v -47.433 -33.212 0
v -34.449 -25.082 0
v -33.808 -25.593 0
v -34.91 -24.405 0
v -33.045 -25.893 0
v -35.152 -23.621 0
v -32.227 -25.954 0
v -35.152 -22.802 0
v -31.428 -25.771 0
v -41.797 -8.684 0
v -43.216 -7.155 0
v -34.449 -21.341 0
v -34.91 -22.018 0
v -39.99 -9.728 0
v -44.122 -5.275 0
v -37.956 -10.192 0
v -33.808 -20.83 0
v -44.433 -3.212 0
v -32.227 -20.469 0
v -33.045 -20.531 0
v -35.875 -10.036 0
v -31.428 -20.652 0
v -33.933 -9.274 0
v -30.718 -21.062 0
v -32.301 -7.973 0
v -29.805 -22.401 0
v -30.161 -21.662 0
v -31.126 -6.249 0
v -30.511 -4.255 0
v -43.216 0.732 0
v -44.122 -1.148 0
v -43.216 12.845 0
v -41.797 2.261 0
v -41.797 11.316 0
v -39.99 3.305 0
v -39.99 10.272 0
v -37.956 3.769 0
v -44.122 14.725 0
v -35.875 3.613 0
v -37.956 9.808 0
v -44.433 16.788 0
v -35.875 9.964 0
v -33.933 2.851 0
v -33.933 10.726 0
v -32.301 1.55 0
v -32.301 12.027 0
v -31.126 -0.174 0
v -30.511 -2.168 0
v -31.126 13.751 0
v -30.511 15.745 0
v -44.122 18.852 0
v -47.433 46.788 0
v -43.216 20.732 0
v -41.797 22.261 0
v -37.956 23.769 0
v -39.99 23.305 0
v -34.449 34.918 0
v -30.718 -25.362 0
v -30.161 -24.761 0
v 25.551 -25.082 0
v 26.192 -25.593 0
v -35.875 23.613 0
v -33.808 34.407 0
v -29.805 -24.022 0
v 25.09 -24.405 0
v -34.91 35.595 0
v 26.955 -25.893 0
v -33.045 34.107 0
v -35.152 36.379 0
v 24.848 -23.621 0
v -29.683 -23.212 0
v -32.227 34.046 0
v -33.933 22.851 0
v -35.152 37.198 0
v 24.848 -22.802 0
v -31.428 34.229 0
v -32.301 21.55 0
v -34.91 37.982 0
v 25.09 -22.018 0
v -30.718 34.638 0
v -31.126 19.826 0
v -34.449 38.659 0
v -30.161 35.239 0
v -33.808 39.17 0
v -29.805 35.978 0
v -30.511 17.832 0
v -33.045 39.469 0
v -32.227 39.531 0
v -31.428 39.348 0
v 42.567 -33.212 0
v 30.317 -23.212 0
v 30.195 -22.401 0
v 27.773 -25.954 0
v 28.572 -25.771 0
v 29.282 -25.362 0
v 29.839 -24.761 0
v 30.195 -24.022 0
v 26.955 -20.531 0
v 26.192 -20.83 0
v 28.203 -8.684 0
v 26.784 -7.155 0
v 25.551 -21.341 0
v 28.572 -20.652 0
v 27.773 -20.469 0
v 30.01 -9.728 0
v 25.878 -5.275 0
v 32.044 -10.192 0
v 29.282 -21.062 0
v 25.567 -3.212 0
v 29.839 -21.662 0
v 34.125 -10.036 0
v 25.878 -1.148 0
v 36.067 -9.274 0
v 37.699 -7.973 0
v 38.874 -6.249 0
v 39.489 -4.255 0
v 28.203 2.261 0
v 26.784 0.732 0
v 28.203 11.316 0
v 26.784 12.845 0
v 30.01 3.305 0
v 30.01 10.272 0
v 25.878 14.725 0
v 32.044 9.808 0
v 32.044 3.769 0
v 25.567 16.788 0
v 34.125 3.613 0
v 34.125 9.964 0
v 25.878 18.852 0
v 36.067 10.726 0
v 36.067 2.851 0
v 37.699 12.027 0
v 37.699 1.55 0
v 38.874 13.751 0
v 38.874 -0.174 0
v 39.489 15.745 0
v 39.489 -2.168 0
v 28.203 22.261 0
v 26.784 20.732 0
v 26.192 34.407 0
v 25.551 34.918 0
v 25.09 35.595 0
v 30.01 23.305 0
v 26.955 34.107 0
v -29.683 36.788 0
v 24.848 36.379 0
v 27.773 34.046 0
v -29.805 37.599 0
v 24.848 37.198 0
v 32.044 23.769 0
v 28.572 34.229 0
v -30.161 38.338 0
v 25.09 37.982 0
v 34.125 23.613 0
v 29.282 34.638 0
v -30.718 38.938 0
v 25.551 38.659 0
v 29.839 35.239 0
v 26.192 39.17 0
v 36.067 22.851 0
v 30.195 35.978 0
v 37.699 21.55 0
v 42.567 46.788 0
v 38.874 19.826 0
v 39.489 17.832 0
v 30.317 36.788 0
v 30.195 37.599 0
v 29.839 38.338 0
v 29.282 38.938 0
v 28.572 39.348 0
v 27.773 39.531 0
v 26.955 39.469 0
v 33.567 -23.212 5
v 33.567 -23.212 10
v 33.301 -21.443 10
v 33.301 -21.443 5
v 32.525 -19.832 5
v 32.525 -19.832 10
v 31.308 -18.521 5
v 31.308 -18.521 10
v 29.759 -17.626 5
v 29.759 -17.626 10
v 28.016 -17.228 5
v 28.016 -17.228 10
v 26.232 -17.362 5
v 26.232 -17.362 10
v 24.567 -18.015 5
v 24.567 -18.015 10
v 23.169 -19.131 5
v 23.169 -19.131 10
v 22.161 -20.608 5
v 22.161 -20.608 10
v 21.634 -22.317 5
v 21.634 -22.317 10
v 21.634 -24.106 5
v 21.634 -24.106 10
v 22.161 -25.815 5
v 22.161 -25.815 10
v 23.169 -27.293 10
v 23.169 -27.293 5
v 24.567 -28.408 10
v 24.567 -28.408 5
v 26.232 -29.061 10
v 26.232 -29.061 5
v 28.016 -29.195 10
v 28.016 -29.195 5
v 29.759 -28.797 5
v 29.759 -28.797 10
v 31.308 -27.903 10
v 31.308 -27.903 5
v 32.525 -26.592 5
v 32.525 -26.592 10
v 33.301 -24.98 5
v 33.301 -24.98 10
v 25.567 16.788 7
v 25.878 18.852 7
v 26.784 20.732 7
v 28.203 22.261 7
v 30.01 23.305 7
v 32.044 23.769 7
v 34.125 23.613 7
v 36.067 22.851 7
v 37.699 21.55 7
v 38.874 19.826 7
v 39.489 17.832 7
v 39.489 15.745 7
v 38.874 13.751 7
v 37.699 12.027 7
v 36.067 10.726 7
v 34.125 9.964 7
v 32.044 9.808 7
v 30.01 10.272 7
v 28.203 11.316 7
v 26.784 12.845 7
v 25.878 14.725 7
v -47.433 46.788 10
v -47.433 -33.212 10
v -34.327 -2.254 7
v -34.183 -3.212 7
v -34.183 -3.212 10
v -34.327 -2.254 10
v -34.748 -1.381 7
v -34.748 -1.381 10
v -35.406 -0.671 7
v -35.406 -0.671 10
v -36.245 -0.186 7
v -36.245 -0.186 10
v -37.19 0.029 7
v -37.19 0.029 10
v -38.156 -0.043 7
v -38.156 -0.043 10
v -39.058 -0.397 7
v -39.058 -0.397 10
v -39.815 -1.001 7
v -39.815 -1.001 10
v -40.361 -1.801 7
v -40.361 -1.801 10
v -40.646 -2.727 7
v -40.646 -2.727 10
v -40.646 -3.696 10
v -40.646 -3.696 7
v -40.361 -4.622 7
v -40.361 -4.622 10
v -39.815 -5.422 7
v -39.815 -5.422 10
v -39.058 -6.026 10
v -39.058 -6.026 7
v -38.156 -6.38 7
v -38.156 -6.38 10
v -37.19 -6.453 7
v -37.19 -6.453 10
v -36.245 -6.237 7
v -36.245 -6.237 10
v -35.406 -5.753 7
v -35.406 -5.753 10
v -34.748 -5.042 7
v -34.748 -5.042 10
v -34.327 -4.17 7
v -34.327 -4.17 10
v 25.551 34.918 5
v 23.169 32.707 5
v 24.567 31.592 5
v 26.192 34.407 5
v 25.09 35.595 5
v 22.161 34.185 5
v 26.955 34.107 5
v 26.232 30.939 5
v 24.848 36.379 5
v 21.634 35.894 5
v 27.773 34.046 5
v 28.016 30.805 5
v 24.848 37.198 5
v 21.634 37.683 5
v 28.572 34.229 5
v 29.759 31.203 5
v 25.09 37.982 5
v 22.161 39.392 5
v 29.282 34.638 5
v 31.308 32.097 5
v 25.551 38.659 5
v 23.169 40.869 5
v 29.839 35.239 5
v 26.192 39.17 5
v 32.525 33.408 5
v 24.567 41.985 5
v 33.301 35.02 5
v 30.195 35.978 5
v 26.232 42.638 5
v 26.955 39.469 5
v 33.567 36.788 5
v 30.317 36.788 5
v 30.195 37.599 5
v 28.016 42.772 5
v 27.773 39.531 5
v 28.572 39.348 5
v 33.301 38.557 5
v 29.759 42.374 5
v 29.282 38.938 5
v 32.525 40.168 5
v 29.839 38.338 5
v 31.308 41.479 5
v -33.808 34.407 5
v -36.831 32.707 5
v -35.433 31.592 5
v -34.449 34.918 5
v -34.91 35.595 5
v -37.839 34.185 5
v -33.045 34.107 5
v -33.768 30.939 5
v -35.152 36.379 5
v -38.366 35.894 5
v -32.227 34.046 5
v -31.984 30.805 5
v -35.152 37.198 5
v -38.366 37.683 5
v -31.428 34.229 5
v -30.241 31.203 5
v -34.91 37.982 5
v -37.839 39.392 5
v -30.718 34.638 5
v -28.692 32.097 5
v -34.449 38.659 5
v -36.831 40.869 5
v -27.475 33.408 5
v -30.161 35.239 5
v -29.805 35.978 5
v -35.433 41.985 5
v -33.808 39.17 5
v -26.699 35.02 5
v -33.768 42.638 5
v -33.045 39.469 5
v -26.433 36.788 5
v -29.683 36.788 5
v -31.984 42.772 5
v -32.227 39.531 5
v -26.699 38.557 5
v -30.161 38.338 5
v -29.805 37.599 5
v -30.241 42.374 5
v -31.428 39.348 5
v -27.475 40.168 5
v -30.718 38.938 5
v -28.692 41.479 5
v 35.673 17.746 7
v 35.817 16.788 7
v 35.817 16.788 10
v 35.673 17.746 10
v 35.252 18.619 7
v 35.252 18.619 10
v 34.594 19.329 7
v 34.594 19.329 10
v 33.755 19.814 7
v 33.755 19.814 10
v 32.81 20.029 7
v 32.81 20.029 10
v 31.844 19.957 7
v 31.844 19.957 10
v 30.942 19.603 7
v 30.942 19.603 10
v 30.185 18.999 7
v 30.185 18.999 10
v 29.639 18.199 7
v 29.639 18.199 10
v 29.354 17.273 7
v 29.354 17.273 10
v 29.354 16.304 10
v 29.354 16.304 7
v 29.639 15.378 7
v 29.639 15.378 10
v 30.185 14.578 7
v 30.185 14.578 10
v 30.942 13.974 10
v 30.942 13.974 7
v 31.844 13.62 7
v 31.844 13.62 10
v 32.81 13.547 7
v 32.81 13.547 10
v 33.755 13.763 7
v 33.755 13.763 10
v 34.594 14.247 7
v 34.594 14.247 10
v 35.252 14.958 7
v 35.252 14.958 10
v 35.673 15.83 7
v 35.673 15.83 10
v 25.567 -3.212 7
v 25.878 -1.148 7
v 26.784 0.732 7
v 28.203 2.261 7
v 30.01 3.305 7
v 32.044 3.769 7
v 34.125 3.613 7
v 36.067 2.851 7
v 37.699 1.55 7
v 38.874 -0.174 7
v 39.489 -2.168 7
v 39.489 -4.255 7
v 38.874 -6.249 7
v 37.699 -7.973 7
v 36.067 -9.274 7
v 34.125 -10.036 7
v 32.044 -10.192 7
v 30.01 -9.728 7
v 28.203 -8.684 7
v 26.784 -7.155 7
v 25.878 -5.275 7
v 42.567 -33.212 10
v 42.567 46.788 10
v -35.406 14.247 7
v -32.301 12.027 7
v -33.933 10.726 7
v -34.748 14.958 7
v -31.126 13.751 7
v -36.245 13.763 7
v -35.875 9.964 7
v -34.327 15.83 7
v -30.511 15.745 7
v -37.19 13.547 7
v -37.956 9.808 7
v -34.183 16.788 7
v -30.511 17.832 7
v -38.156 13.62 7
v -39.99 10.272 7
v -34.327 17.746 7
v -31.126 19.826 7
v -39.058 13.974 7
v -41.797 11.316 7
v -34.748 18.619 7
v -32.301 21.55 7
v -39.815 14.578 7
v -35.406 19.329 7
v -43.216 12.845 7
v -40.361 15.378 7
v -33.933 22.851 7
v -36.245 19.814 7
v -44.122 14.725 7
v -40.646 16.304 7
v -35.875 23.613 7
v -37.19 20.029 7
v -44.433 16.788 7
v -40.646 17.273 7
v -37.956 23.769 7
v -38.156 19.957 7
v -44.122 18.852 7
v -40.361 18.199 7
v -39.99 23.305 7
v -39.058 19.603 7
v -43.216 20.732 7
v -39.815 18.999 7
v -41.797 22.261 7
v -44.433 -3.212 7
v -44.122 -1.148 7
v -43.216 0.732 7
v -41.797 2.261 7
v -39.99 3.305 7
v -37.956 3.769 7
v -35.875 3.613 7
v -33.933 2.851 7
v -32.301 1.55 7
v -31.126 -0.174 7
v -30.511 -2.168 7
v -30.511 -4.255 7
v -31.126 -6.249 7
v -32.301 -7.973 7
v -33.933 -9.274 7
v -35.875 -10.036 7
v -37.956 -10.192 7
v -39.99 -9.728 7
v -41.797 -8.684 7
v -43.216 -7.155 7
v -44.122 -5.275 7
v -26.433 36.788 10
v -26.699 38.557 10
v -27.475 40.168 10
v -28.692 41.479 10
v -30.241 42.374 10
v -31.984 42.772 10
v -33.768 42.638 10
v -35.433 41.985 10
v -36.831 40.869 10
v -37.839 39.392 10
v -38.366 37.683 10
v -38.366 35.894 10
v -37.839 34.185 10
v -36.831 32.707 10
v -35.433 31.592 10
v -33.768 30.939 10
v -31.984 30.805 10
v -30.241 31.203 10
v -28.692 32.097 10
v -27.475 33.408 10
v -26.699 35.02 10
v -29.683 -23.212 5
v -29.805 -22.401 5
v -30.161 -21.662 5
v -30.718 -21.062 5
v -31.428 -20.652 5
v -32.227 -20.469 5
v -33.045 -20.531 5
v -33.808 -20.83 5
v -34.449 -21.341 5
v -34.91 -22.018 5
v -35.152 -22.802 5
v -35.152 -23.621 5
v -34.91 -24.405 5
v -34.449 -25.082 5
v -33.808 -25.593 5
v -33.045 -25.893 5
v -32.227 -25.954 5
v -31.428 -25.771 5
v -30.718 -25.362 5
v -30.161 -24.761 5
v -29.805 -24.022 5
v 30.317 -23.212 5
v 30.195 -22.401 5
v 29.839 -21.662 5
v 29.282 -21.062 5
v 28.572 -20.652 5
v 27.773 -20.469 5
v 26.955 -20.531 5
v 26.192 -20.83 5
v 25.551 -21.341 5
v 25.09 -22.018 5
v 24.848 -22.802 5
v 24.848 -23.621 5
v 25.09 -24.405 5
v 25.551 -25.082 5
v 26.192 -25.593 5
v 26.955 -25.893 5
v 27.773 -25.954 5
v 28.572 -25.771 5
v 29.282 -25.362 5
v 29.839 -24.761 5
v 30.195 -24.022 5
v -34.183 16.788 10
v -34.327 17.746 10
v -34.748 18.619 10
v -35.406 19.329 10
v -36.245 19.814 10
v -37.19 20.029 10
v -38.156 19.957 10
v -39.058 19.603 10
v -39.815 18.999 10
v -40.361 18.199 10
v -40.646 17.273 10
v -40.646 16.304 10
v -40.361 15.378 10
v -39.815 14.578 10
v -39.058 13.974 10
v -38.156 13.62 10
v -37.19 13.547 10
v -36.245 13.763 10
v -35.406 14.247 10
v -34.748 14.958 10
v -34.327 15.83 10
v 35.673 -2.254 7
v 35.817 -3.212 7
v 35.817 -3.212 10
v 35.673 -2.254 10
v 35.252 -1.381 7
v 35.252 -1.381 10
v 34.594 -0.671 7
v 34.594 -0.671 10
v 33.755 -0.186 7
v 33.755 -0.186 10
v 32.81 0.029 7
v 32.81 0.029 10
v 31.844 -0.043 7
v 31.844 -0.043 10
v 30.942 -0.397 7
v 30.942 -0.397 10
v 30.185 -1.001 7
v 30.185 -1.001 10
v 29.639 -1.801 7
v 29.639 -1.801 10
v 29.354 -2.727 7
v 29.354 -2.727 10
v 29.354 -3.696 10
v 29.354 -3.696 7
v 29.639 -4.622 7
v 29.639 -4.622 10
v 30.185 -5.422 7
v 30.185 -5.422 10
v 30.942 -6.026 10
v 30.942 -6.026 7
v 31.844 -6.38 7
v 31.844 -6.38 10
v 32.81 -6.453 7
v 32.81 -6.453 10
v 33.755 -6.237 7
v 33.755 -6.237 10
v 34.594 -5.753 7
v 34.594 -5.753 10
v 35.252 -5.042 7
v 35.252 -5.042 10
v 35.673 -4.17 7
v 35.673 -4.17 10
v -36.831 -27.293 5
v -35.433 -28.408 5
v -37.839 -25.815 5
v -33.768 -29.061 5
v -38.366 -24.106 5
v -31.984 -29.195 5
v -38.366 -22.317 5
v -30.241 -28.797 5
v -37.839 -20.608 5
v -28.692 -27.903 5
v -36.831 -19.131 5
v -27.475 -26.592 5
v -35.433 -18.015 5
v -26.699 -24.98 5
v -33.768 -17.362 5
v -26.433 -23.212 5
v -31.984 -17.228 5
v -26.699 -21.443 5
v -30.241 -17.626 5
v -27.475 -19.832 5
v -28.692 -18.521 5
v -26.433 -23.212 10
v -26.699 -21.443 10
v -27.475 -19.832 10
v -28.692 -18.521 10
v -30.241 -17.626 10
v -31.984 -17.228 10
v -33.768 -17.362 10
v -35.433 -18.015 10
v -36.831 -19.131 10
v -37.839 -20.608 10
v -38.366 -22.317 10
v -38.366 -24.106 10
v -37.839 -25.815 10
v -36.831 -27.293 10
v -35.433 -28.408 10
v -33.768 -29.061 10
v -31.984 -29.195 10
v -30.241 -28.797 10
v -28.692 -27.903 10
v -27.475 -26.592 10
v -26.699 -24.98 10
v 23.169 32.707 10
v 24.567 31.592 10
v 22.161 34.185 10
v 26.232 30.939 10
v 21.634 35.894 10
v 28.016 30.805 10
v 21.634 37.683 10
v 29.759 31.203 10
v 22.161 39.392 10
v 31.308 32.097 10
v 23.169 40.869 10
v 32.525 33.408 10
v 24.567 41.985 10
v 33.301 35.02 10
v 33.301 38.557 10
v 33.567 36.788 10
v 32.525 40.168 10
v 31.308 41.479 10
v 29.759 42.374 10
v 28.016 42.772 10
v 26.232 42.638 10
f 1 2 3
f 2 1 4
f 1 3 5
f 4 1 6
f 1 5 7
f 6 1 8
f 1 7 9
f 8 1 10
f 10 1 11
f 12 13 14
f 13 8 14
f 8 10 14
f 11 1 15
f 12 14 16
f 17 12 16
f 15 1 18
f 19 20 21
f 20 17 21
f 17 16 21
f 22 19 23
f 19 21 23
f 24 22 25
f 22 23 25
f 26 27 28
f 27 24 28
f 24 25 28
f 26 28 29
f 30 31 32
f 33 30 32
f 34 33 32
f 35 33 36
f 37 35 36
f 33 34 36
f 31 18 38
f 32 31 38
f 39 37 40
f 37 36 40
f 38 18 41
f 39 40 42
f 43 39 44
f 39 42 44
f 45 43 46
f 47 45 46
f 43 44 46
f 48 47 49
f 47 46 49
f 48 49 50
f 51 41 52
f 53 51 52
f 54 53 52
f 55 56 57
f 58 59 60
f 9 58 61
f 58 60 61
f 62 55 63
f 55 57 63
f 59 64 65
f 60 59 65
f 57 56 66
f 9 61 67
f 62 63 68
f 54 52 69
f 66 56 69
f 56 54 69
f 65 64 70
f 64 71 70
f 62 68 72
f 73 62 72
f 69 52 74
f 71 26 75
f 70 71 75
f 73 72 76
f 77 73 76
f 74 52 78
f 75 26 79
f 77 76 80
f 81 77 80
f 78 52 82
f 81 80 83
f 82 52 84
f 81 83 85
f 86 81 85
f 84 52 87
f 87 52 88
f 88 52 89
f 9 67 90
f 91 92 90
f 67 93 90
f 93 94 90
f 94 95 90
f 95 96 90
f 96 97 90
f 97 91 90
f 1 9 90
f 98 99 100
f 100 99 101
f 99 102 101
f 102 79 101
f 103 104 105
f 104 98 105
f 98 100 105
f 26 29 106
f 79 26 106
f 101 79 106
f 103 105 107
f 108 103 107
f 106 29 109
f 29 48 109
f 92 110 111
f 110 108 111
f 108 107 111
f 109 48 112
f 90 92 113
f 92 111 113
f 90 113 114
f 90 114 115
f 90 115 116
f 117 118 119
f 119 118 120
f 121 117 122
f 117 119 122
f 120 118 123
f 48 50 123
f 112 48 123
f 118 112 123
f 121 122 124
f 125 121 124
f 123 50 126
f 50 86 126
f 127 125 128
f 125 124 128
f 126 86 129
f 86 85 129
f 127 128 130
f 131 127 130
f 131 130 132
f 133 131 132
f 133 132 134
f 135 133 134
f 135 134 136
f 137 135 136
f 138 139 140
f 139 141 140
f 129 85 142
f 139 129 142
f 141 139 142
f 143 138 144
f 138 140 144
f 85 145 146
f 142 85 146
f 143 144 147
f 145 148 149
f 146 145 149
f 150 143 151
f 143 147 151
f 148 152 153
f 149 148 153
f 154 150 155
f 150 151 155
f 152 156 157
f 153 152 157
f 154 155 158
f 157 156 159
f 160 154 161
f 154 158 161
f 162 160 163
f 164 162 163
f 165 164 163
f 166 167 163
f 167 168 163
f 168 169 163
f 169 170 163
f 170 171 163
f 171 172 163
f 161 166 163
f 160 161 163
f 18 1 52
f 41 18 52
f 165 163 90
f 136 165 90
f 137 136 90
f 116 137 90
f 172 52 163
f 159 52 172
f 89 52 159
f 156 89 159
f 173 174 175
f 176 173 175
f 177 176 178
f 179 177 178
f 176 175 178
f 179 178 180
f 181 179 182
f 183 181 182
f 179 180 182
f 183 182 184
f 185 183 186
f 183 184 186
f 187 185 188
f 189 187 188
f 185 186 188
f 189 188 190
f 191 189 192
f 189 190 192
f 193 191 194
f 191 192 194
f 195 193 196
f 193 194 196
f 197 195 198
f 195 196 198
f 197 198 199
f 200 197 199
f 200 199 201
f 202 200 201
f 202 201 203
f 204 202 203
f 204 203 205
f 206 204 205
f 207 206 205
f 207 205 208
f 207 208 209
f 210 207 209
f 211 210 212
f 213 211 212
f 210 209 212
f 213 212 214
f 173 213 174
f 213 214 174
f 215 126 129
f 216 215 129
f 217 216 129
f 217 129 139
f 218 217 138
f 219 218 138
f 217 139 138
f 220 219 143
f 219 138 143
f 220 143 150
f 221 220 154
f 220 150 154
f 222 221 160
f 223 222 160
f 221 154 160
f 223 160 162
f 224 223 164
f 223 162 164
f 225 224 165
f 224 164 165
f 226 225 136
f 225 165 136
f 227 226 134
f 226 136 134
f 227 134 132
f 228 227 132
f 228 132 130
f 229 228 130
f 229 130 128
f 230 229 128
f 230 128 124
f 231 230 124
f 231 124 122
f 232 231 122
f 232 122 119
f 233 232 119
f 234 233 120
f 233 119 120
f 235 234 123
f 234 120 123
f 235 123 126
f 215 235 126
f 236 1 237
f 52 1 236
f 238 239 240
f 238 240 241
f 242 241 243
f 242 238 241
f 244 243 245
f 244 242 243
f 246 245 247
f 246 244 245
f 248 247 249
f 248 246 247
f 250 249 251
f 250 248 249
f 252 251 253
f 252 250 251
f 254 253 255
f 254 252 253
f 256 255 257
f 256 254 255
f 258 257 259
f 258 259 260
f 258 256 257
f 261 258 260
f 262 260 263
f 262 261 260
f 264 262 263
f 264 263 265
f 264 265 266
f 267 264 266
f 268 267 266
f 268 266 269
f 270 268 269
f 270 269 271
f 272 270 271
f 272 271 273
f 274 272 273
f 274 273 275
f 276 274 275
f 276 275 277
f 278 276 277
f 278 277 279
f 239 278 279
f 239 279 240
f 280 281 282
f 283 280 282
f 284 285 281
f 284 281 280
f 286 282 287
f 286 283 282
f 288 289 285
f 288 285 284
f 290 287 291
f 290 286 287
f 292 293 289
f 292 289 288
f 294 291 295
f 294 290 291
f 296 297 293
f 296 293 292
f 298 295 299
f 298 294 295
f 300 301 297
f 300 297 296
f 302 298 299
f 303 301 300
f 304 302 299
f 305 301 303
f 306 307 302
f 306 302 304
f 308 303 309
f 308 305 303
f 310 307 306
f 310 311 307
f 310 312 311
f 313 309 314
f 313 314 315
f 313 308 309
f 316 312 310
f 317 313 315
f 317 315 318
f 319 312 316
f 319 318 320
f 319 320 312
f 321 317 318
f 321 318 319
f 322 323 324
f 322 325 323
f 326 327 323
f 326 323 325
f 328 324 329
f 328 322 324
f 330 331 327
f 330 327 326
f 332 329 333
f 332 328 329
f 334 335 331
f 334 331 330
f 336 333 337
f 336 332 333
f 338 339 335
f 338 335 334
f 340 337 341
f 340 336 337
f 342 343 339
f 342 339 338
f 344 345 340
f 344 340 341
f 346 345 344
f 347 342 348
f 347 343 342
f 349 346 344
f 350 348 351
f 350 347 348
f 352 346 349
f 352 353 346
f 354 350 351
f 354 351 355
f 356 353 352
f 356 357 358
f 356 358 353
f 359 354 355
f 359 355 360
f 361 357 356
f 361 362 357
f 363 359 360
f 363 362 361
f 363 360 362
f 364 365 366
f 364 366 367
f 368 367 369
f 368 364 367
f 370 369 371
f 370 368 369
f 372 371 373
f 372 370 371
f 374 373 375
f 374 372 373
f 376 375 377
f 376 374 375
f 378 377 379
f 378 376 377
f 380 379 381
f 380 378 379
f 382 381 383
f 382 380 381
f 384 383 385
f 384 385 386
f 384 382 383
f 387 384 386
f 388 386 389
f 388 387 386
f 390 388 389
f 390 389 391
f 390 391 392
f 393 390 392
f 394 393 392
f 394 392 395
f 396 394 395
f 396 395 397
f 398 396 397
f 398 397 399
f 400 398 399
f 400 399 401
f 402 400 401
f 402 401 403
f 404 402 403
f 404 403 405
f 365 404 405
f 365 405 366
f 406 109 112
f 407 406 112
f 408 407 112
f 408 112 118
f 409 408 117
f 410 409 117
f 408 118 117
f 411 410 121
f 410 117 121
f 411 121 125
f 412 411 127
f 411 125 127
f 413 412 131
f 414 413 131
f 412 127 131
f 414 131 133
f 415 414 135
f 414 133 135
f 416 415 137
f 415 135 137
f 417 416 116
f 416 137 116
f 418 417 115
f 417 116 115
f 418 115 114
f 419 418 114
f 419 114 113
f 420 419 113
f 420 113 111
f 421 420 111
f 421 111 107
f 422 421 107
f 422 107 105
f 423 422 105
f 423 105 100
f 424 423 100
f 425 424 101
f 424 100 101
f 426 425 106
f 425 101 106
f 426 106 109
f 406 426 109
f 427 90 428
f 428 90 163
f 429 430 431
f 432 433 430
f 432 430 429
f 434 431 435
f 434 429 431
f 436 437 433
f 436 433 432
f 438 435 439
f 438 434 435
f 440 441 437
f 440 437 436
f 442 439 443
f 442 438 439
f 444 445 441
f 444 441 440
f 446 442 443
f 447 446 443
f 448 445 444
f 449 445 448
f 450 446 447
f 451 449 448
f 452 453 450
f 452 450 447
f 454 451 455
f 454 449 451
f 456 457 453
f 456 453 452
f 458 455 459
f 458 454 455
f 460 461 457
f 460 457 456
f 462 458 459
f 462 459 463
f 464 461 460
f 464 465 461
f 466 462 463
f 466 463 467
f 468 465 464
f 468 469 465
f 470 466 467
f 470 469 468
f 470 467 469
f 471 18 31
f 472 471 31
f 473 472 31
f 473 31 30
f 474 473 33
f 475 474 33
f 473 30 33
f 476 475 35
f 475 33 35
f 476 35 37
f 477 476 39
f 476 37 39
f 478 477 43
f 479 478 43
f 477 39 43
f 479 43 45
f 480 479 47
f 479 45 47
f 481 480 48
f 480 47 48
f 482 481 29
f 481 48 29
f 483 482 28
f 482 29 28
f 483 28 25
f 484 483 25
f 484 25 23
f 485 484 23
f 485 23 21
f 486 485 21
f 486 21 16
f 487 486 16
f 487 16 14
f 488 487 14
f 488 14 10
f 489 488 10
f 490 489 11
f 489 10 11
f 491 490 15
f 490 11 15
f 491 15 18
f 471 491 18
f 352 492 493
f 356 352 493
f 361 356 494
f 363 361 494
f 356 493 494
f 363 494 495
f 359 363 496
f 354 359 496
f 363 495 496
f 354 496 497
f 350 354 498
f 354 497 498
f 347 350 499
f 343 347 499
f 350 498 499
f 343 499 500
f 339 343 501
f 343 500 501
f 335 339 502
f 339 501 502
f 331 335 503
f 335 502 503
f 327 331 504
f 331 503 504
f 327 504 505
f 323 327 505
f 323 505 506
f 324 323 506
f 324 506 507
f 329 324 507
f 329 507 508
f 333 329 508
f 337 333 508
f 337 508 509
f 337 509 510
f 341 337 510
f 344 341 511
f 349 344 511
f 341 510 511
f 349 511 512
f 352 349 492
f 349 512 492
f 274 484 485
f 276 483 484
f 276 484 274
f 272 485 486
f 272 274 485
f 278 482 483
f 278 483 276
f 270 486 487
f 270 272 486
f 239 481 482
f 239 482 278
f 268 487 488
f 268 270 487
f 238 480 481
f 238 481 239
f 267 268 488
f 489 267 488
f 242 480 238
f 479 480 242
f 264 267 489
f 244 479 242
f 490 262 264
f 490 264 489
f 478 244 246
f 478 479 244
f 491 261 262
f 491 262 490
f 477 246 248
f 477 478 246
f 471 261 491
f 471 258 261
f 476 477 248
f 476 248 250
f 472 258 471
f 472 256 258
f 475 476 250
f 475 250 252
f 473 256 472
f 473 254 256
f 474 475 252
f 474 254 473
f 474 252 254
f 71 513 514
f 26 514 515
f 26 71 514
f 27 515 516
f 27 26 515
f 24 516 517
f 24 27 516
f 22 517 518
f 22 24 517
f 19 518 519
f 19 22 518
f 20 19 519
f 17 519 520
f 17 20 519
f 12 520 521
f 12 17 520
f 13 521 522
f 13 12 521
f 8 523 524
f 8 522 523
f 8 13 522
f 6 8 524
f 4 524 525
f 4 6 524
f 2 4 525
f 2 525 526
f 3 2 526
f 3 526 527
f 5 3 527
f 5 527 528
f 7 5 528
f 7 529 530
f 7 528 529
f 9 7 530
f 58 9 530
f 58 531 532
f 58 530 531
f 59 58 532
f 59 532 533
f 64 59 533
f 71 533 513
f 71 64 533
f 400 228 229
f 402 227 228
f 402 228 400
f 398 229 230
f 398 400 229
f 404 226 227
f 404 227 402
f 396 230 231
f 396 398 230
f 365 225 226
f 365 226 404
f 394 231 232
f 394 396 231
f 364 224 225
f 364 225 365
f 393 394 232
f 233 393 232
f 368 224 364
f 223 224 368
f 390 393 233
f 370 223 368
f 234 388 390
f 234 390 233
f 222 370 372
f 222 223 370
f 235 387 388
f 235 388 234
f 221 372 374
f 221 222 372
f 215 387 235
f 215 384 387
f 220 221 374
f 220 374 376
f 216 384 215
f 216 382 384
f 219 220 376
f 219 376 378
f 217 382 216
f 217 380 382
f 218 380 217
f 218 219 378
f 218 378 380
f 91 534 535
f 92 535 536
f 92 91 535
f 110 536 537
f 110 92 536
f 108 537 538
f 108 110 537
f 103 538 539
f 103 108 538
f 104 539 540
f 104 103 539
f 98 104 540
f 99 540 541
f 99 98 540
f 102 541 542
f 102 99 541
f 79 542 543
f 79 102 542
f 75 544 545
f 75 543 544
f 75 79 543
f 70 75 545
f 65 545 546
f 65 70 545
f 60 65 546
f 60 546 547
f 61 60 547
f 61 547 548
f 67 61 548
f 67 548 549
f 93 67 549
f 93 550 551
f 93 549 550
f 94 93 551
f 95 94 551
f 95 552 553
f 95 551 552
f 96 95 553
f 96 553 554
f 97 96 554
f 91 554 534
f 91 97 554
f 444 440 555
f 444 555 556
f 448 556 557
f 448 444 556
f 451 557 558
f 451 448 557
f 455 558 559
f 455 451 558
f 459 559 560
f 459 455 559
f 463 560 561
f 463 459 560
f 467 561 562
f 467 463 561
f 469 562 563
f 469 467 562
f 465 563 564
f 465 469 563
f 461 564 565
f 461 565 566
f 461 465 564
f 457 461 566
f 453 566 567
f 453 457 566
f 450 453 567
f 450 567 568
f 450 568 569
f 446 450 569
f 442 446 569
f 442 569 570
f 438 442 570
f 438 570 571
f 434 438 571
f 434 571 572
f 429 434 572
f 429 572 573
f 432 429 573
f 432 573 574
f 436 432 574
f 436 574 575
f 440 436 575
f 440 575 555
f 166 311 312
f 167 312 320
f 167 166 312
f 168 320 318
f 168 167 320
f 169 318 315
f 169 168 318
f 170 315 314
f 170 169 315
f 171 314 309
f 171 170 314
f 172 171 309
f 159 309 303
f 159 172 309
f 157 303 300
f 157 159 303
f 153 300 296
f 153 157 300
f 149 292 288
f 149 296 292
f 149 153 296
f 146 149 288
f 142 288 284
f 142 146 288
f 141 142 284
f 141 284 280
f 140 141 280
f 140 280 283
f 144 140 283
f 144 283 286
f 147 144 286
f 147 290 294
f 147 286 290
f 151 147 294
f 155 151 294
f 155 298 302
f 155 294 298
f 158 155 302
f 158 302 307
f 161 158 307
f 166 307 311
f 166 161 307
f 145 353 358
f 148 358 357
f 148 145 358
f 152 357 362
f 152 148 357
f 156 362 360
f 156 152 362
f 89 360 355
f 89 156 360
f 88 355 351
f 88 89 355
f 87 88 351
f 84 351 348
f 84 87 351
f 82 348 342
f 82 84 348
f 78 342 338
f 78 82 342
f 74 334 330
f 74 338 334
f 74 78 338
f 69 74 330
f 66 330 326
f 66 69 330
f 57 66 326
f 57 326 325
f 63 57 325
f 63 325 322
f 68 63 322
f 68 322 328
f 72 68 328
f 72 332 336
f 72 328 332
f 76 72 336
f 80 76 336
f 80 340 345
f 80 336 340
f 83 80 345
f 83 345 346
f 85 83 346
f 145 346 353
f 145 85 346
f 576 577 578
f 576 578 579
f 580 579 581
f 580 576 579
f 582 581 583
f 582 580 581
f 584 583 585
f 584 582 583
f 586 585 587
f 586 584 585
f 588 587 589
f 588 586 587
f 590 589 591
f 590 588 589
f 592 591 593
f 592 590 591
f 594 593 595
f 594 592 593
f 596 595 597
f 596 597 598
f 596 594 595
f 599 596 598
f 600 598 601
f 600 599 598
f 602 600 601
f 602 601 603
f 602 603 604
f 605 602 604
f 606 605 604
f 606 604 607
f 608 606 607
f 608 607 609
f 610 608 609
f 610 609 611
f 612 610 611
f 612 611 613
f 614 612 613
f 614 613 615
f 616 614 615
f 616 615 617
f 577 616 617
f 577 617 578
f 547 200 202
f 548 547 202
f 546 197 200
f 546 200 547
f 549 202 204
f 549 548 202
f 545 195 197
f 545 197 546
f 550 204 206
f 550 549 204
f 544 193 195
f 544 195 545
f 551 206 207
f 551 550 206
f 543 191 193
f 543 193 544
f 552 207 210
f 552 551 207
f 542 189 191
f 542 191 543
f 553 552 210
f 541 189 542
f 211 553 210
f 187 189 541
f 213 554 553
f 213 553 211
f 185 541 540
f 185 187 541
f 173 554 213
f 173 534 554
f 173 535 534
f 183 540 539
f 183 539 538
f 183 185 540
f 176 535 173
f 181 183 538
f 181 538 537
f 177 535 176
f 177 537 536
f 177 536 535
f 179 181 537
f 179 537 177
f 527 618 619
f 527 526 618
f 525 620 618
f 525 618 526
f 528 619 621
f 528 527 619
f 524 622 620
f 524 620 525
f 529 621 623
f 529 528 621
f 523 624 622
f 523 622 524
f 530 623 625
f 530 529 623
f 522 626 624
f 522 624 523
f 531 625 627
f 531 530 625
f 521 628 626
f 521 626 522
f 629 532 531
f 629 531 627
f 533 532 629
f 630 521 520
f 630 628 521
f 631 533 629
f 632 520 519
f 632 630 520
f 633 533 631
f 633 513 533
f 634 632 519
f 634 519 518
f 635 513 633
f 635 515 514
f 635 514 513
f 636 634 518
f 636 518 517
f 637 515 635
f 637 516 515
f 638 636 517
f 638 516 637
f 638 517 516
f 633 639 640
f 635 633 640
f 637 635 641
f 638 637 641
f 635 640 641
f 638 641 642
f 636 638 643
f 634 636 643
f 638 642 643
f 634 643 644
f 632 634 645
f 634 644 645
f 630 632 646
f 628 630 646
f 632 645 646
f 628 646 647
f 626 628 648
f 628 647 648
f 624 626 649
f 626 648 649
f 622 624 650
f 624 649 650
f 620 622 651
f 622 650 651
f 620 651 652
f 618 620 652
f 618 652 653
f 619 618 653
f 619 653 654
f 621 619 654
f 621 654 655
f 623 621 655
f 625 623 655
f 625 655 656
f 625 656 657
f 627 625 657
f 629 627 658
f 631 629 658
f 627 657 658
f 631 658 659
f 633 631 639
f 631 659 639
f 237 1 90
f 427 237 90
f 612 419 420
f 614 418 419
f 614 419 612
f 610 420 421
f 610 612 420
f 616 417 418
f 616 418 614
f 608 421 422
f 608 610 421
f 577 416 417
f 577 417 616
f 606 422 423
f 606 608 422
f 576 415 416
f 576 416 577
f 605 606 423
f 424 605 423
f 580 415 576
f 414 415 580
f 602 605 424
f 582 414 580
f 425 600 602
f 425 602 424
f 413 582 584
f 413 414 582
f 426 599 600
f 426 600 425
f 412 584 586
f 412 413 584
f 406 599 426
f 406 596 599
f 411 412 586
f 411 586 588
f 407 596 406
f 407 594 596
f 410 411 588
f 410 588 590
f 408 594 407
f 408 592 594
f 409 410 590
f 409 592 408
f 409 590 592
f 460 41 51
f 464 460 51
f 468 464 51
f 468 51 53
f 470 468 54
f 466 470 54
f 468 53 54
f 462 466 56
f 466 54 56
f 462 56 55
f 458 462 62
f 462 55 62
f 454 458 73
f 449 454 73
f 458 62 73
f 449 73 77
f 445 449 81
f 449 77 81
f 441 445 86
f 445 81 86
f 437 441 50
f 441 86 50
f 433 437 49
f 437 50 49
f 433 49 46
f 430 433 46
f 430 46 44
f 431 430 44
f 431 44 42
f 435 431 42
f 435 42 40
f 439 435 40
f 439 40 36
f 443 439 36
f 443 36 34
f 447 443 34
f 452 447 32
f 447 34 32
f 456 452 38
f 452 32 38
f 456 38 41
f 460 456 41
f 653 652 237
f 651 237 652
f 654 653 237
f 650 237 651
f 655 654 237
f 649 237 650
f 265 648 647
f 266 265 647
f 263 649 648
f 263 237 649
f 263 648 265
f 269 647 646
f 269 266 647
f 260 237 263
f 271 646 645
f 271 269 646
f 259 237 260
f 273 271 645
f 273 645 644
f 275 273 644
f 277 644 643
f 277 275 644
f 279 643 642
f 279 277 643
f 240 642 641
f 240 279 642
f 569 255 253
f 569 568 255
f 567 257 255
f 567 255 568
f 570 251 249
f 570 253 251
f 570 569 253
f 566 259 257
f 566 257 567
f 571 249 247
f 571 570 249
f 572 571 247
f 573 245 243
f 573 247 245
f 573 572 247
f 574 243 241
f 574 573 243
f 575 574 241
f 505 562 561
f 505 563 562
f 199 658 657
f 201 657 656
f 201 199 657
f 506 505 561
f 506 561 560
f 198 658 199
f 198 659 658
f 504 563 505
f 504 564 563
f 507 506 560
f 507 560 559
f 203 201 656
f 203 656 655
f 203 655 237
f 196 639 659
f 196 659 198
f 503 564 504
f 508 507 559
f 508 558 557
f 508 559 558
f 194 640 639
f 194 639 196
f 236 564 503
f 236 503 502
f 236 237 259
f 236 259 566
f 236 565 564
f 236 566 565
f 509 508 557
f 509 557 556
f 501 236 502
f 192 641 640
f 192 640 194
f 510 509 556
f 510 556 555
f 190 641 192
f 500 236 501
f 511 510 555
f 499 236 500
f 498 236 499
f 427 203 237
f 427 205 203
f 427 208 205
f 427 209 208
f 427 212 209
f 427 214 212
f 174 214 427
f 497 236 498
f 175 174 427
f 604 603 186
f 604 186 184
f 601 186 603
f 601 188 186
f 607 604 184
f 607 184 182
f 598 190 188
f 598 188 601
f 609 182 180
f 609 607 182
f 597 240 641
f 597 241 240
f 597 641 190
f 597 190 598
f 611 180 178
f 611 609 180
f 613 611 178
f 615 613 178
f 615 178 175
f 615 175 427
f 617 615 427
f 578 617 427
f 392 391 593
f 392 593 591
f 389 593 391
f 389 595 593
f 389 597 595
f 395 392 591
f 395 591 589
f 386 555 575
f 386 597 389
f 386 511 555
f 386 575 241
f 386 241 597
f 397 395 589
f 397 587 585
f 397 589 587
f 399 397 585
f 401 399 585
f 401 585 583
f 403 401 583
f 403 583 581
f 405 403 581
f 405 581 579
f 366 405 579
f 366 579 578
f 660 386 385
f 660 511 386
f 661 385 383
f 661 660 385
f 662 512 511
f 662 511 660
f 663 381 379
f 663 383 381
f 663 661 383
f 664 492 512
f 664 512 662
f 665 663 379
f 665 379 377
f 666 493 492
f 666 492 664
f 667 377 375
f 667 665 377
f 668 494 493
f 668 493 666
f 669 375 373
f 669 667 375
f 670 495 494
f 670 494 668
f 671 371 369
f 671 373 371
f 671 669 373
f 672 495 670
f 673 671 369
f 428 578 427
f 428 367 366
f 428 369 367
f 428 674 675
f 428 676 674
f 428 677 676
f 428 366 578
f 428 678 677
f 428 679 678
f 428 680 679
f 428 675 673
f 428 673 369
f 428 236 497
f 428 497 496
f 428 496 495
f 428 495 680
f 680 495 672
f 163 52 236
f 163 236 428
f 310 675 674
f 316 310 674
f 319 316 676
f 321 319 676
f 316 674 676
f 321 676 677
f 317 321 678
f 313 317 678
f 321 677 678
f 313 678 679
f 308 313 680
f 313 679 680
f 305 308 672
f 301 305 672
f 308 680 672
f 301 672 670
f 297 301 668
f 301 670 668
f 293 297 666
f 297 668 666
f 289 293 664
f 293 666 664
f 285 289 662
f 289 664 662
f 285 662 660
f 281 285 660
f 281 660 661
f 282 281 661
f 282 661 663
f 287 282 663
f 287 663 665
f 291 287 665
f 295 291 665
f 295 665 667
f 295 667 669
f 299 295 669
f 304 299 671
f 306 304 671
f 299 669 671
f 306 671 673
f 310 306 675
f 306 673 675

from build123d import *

# Parameters (mm, degrees)
ESQUISSE1_W             = 90
ESQUISSE1_H             = 80
ESQUISSE1_R             = 2.75
ESQUISSE1_R_2           = 3.25
BOSS_EXTRU_1_DEPTH      = 10
ESQUISSE2_R             = 6
ENL_V_MAT_EXTRU_1_DEPTH = 5
ESQUISSE4_R             = 7
ENL_V_MAT_EXTRU_2_DEPTH = 7


with BuildPart() as part:
    # Esquisse1 → Boss.-Extru.1 (new body)
    with BuildSketch(Plane.XY):
        with Locations((-2.432799292, 6.788403994)):
            Rectangle(ESQUISSE1_W, ESQUISSE1_H)
        with Locations((-32.432799292, 36.788403994)):
            Circle(ESQUISSE1_R, mode=Mode.SUBTRACT)
        with Locations((27.567200708, 36.788403994)):
            Circle(ESQUISSE1_R, mode=Mode.SUBTRACT)
        with Locations((27.567200708, -23.211596006)):
            Circle(ESQUISSE1_R, mode=Mode.SUBTRACT)
        with Locations((-32.432799292, -23.211596006)):
            Circle(ESQUISSE1_R, mode=Mode.SUBTRACT)
        with Locations((-37.432799292, 16.788403994)):
            Circle(ESQUISSE1_R_2, mode=Mode.SUBTRACT)
        with Locations((-37.432799292, -3.211596006)):
            Circle(ESQUISSE1_R_2, mode=Mode.SUBTRACT)
        with Locations((32.567200708, 16.788403994)):
            Circle(ESQUISSE1_R_2, mode=Mode.SUBTRACT)
        with Locations((32.567200708, -3.211596006)):
            Circle(ESQUISSE1_R_2, mode=Mode.SUBTRACT)
    extrude(amount=BOSS_EXTRU_1_DEPTH)

    # Esquisse2 → Enlèv. mat.-Extru.1 (cut)
    with BuildSketch(Plane.XY.offset(10)):
        with Locations((-32.432799292, 36.788403994)):
            Circle(ESQUISSE2_R)
        with Locations((27.567200708, 36.788403994)):
            Circle(ESQUISSE2_R)
        with Locations((27.567200708, -23.211596006)):
            Circle(ESQUISSE2_R)
        with Locations((-32.432799292, -23.211596006)):
            Circle(ESQUISSE2_R)
    extrude(amount=-ENL_V_MAT_EXTRU_1_DEPTH, mode=Mode.SUBTRACT)

    # Esquisse4 → Enlèv. mat.-Extru.2 (cut)
    with BuildSketch(Plane(origin=(0, 0, 0), x_dir=(-1, 0, 0), z_dir=(0, 0, -1))):
        with Locations((-32.567200708, 16.788403994)):
            Circle(ESQUISSE4_R)
        with Locations((37.432799292, 16.788403994)):
            Circle(ESQUISSE4_R)
        with Locations((37.432799292, -3.211596006)):
            Circle(ESQUISSE4_R)
        with Locations((-32.567200708, -3.211596006)):
            Circle(ESQUISSE4_R)
    extrude(amount=-ENL_V_MAT_EXTRU_2_DEPTH, mode=Mode.SUBTRACT)


solid = part.part
